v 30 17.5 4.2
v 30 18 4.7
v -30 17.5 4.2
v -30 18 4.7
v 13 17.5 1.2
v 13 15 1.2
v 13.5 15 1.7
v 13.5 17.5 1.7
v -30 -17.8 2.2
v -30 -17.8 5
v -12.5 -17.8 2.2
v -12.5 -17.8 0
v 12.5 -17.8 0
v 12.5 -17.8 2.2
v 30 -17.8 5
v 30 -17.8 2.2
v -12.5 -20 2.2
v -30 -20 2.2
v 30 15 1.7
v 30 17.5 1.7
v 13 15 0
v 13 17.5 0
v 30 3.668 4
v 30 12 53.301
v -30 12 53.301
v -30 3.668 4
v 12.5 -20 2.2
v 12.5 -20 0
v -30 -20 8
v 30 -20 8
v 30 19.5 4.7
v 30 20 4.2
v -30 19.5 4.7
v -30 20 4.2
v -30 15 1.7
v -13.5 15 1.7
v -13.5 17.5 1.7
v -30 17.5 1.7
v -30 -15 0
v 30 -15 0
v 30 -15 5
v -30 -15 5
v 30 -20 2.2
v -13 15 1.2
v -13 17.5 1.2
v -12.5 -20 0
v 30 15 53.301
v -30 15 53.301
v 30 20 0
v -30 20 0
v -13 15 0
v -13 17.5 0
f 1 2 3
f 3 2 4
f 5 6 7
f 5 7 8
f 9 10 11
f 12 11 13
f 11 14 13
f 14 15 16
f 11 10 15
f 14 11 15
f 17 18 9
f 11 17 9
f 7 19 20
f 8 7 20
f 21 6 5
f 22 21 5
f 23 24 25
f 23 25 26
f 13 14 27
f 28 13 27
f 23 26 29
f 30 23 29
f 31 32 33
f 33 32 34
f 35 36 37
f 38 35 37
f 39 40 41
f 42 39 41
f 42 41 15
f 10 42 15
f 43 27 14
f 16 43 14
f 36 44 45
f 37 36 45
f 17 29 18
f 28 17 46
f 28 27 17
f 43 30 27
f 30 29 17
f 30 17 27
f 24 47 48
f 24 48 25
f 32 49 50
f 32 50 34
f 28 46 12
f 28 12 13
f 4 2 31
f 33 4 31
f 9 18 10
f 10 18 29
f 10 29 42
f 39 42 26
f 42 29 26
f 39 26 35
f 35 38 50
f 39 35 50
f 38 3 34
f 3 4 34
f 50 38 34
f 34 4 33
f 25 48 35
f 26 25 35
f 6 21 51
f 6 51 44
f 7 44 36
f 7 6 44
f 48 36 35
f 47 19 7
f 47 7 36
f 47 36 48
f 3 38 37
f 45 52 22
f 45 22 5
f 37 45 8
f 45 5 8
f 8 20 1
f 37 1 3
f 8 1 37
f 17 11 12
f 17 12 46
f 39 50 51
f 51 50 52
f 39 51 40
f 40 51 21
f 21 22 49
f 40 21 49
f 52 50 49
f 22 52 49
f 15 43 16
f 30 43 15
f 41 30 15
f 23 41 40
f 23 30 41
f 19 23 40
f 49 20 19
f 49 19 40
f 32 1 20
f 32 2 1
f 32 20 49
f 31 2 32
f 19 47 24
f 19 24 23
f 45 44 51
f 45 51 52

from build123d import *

# Parameters (mm, degrees)
F0_W      = 60
F0_H      = 40
F1_DEPTH  = 4
F3_DEPTH  = 60
F4_W      = 2.2
F4_H      = 2.2
F4_W_2    = 2.5
F4_H_2    = 2.3
F5_DEPTH  = 60
F4_H_3    = 0.7
F6_DEPTH  = 60
F7_W      = 25
F7_H      = 2.2
F8_DEPTH  = 2.2
F9_W      = 26
F9_H      = 2.5
F10_DEPTH = 1.7
F11_SIZE  = 0.5


with BuildPart() as f1:
    # F0 (on Top) → F1 (new body)
    with BuildSketch(Plane.XY):
        Rectangle(F0_W, F0_H)
    extrude(amount=F1_DEPTH)

    # F2 (on face) → F3 (join, through all)
    with BuildSketch(Plane.YZ.offset(30)):
        Polygon((12, 53.300871376), (3.6678885292, 4), (15, 4), (15, 53.300871376), align=None)
        Polygon((-20, 8), (-20, 4), (3.6678885292, 4), align=None)
    extrude(amount=-F3_DEPTH)

    # F4 (on face) → F5 (cut, through all)
    with BuildSketch(Plane.YZ.offset(30)):
        with Locations((-18.9, 1.1)):
            Rectangle(F4_W, F4_H)
        Polygon((-17.8, 2.2), (-17.8, 0), (-15, 0), (-15, 5), (-17.8, 5), align=None)
        with Locations((16.25, 2.85)):
            Rectangle(F4_W_2, F4_H_2)
    extrude(amount=-F5_DEPTH, mode=Mode.SUBTRACT)

    # F4 (on face) → F6 (join, through all)
    with BuildSketch(Plane.YZ.offset(30)):
        with Locations((18.75, 4.35)):
            Rectangle(F4_W_2, F4_H_3)
    extrude(amount=-F6_DEPTH)

    # F7 (on face) → F8 (join, through all)
    with BuildSketch(Plane(origin=(0, 0, 2.2), x_dir=(1, 0, 0), z_dir=(0, 0, -1))):
        with Locations((0, 18.9)):
            Rectangle(F7_W, F7_H)
    extrude(amount=F8_DEPTH)

    # F9 (on face) → F10 (cut, through all)
    with BuildSketch(Plane.XY.offset(1.7)):
        with Locations((0, 16.25)):
            Rectangle(F9_W, F9_H)
    extrude(amount=-F10_DEPTH, mode=Mode.SUBTRACT)

    # F11
    f11_edges = [f1.edges().sort_by_distance(p)[0] for p in [
        (0, 20, 4.7),
        (0, 17.5, 4.7),
        (-13, 16.25, 1.7),
        (13, 16.25, 1.7),
    ]]
    chamfer(f11_edges, length=F11_SIZE)


solid = f1.part
